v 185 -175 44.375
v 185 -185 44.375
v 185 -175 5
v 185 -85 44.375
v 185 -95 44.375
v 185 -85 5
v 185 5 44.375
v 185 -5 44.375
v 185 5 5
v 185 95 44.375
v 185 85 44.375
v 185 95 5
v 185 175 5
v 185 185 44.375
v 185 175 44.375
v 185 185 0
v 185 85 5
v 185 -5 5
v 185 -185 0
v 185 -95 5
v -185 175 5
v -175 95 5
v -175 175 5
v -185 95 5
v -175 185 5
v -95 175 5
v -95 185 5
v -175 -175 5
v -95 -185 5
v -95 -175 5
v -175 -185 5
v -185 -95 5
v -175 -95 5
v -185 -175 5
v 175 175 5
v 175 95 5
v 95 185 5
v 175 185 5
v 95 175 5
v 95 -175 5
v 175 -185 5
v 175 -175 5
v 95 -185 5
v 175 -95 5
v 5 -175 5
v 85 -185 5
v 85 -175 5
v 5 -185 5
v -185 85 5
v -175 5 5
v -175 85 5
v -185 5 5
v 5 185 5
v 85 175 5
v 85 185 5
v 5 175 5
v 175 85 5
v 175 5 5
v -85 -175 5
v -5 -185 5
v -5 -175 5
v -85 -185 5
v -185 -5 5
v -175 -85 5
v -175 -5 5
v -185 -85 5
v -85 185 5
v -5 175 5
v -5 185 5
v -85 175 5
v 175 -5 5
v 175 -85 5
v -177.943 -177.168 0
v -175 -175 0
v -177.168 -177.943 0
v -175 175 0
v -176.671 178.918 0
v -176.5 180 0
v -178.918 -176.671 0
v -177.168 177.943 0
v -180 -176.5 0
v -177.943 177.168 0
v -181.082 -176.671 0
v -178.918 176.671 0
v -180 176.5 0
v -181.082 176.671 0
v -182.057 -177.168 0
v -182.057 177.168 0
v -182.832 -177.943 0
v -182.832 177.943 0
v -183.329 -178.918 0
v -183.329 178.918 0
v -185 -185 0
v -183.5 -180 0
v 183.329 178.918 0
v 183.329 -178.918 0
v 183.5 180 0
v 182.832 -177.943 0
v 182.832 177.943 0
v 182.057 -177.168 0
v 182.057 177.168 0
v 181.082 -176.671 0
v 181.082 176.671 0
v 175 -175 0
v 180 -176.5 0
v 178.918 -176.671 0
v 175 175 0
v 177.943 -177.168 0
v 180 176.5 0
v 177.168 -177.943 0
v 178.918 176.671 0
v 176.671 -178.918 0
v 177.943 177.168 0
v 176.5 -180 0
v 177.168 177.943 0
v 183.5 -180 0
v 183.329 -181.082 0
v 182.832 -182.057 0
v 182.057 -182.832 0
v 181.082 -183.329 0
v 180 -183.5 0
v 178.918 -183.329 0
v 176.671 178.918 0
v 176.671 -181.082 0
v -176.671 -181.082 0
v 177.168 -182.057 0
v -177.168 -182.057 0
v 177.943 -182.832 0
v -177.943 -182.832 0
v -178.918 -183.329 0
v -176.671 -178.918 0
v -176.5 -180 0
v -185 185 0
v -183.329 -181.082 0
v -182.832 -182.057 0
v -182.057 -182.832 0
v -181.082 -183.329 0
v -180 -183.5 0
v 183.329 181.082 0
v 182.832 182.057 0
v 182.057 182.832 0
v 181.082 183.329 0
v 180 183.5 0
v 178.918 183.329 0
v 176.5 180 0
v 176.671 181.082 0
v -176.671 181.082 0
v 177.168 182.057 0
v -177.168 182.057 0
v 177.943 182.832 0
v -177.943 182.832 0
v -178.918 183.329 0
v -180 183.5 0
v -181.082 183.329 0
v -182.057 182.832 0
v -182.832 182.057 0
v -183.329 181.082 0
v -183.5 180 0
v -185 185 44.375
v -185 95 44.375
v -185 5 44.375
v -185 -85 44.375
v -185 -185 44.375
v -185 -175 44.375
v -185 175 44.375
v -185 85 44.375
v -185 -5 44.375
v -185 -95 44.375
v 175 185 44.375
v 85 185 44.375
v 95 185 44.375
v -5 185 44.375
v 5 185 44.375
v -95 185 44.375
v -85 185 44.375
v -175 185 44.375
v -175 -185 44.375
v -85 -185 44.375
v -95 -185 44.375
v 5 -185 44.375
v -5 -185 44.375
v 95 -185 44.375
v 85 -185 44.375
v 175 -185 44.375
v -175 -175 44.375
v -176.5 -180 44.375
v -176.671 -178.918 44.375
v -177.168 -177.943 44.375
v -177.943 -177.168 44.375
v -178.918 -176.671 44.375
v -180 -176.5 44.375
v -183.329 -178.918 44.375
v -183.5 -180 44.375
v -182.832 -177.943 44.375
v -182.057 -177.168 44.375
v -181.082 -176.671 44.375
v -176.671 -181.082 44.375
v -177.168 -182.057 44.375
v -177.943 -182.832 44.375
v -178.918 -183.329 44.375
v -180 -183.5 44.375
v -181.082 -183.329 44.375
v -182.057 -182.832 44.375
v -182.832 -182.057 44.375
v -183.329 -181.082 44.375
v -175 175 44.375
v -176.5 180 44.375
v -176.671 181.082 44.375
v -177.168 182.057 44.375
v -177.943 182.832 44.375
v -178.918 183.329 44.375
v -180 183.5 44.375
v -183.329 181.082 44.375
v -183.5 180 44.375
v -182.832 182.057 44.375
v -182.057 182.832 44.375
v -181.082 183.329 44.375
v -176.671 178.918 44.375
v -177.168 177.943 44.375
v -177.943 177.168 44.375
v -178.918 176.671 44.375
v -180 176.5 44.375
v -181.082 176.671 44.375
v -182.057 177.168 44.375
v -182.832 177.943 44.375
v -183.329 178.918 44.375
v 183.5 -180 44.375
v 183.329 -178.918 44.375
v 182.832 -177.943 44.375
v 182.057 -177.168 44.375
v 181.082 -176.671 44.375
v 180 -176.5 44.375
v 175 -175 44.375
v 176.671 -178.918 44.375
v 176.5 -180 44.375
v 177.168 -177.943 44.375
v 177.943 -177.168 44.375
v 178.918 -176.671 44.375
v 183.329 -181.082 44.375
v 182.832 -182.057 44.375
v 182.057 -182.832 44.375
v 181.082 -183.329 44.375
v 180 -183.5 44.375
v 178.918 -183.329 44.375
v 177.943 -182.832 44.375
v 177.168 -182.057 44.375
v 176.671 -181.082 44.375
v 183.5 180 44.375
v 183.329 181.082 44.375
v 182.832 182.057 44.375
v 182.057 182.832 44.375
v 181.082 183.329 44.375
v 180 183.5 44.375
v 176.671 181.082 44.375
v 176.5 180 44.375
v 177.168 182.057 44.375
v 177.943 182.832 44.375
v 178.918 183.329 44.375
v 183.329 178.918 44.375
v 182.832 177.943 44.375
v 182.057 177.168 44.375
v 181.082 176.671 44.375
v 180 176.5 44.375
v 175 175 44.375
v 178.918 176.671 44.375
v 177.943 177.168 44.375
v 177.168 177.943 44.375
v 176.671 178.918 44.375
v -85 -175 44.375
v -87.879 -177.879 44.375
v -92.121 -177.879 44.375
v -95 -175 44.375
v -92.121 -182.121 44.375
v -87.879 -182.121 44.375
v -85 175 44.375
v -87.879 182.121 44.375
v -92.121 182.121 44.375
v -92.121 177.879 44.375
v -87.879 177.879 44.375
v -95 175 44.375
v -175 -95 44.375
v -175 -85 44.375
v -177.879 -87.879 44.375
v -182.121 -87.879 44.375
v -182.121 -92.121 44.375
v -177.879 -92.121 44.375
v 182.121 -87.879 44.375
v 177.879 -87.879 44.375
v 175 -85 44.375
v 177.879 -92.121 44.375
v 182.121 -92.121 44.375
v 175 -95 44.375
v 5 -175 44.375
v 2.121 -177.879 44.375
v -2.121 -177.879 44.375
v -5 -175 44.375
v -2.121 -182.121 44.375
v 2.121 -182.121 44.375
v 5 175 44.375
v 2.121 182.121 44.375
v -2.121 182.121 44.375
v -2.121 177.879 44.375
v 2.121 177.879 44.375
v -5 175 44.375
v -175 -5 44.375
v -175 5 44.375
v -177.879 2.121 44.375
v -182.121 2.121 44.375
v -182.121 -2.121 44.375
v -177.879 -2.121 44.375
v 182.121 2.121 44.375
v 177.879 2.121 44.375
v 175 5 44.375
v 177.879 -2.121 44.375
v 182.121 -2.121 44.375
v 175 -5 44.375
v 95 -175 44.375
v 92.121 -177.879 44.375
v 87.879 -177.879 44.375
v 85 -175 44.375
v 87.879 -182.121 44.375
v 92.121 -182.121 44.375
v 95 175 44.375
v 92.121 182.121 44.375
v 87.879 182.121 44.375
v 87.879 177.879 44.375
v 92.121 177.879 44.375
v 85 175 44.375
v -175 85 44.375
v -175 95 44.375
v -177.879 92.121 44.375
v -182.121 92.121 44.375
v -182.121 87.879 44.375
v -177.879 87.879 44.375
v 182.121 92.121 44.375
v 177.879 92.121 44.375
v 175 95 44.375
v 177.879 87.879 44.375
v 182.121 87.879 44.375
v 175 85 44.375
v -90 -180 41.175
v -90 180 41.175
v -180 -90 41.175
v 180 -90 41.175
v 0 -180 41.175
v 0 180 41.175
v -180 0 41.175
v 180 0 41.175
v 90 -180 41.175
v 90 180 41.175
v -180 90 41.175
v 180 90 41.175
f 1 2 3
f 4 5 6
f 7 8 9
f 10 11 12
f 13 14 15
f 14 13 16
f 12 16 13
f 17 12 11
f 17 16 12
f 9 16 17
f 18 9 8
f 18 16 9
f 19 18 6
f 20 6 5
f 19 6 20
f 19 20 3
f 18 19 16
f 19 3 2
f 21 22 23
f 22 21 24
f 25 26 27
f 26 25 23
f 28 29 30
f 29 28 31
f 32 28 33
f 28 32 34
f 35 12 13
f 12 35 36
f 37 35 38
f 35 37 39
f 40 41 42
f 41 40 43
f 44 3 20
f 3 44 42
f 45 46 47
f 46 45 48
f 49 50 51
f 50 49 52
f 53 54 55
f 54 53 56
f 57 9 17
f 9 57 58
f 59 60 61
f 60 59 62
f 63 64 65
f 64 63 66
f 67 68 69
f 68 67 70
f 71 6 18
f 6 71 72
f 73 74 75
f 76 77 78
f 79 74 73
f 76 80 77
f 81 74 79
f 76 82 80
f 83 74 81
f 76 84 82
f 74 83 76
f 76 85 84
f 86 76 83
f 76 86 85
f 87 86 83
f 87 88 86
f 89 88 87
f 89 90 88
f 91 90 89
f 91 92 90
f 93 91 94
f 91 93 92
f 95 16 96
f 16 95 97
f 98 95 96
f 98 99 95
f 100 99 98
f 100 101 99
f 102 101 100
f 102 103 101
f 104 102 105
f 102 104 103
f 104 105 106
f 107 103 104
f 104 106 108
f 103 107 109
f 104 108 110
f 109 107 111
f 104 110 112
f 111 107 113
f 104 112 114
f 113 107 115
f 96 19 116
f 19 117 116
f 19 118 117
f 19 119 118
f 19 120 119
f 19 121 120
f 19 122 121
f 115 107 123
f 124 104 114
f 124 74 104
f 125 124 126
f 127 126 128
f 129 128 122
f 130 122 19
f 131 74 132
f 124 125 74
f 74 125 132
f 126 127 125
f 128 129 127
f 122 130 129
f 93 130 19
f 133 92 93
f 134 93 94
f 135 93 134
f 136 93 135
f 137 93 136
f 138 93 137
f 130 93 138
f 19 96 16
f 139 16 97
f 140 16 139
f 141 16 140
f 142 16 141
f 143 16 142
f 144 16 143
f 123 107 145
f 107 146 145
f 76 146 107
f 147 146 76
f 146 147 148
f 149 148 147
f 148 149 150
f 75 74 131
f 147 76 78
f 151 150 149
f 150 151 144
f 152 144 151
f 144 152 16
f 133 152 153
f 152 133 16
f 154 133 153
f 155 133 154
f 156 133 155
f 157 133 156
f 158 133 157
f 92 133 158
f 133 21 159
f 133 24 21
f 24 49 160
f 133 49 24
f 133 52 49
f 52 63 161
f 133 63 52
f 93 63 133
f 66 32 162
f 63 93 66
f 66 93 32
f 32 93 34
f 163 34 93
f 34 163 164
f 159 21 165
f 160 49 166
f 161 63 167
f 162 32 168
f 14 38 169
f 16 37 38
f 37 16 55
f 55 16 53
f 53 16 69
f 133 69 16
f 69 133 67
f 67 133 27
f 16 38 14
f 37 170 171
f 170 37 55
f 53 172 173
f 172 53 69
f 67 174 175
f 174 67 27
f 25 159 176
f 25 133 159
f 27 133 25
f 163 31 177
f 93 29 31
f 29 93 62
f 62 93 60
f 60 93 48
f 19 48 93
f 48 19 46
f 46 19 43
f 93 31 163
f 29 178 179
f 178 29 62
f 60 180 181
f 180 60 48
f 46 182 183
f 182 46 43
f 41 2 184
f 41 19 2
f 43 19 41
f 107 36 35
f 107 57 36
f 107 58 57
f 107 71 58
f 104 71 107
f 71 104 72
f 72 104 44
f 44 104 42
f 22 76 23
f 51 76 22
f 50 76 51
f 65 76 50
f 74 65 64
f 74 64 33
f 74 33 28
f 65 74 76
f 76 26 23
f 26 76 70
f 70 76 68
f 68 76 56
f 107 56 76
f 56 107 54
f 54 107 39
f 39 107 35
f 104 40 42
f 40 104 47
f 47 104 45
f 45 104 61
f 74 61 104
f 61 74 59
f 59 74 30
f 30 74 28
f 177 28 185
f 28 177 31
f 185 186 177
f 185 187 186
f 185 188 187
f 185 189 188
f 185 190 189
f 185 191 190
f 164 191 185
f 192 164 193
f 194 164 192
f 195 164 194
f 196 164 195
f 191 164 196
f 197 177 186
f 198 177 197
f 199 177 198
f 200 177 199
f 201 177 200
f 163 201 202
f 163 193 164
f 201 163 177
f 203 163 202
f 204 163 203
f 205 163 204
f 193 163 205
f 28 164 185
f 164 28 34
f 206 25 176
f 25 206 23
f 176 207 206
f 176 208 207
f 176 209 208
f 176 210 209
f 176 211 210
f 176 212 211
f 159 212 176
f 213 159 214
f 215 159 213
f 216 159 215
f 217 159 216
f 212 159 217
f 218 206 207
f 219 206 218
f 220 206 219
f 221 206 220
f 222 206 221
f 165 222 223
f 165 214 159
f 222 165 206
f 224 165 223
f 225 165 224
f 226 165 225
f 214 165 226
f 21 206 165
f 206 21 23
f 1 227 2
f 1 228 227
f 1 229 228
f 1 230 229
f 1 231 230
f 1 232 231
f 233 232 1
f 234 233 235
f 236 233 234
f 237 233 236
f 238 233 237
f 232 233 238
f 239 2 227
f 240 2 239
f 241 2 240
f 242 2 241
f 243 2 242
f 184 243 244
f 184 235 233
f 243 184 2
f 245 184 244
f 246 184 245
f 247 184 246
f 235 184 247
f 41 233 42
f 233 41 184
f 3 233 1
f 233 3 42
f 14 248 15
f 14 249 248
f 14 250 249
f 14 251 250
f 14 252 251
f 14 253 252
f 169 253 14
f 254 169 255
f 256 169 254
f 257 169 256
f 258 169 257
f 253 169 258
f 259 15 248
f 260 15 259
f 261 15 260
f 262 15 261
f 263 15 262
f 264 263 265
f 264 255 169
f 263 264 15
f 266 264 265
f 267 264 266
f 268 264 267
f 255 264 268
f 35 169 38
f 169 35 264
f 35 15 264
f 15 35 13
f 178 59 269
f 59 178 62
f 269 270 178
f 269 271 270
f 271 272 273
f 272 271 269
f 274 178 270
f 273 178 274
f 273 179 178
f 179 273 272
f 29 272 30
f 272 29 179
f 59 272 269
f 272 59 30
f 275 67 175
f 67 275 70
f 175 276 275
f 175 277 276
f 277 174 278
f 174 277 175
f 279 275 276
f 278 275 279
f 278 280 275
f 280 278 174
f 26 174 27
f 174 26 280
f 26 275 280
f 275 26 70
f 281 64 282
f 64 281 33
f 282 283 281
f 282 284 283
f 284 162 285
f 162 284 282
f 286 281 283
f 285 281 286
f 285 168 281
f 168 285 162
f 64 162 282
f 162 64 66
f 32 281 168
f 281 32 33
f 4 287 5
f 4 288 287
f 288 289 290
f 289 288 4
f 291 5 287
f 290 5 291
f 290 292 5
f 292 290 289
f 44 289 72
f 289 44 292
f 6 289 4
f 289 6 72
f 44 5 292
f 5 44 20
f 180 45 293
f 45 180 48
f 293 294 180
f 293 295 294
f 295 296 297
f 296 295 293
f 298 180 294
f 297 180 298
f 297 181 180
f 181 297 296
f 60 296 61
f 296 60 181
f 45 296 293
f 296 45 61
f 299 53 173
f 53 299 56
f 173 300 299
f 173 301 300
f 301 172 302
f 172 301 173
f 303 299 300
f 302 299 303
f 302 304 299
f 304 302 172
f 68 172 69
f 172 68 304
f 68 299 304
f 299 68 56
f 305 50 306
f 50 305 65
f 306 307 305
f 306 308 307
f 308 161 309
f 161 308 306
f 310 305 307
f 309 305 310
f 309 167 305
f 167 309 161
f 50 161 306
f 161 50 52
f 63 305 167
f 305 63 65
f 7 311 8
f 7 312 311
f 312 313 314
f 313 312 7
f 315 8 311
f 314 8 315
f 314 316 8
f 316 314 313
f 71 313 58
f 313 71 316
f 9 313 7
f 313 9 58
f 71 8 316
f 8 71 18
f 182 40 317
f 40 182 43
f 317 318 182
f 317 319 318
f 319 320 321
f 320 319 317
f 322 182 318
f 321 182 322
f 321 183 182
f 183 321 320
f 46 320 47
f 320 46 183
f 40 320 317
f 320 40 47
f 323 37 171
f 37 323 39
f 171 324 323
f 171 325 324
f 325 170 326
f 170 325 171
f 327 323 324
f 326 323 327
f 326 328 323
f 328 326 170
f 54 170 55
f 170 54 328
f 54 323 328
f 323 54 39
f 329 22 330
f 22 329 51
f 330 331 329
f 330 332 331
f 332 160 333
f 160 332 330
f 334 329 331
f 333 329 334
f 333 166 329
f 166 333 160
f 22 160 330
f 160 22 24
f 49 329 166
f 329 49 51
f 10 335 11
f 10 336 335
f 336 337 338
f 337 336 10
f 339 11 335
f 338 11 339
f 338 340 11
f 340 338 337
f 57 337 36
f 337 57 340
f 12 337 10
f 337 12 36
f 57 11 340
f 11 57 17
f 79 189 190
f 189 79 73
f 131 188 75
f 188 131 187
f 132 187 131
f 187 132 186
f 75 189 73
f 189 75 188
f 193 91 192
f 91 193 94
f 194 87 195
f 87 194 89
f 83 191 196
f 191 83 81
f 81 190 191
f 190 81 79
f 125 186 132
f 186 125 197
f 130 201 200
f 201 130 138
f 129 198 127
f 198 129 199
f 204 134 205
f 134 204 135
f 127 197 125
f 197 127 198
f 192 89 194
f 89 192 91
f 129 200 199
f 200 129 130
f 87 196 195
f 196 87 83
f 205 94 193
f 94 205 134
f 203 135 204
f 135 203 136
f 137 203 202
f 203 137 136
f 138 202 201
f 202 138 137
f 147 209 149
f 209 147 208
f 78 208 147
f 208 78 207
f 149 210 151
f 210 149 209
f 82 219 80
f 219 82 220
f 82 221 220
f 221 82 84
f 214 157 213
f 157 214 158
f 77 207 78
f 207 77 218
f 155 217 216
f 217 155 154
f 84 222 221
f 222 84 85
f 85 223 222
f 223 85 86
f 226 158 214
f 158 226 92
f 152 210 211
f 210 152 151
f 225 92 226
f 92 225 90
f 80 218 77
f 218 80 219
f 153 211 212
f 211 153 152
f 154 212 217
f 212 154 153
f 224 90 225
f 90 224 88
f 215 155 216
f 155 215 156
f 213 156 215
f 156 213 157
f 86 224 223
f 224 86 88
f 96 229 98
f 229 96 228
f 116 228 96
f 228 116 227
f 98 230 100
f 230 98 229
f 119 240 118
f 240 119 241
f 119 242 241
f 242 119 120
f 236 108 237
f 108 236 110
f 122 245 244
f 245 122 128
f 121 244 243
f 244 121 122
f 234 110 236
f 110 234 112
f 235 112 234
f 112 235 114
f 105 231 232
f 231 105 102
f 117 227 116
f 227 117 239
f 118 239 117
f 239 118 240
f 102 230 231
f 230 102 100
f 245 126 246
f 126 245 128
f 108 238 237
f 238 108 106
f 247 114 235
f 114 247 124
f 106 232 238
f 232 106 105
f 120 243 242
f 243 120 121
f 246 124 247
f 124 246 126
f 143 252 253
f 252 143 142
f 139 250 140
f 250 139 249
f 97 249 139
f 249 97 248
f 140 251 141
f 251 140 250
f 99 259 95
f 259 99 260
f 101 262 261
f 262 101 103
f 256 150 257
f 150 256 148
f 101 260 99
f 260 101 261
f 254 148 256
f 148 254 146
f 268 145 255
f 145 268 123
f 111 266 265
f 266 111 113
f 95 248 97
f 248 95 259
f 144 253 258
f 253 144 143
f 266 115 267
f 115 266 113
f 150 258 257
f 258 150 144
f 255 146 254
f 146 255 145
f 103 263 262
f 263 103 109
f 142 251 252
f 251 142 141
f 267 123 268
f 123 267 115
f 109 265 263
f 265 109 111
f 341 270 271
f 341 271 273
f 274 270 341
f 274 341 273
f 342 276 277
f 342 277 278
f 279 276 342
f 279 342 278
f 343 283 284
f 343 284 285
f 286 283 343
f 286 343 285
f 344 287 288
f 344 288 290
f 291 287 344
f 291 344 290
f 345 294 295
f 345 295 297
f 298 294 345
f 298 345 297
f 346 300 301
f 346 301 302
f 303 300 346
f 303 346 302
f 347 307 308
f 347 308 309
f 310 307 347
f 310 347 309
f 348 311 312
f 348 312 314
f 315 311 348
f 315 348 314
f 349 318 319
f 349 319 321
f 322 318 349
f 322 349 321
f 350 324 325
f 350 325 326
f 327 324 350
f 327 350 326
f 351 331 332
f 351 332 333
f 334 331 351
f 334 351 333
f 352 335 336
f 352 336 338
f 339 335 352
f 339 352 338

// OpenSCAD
module pyramid_socket() {
    // Inverted pyramid for subtraction, slightly larger for clearance
    rotate([0,0,45]) cylinder(h=3.2, d1=0, d2=6.0, $fn=4);
}

module hemi_female() {
    bar_h = 39.375;
    difference() {
        union() {
            // Base Ring
            translate([0,0,2.5]) difference() {
                cube([370, 370, 5], center=true);
                cube([350, 350, 5.1], center=true);
            }
            // Bars
            // Corners
            for (x = [-180, 180]) {
                for (y = [-180, 180]) {
                    translate([x, y, 5 + bar_h/2]) cube([10, 10, bar_h], center=true);
                }
            }
            // Intermediates
            for (i = [-90, 0, 90]) {
                for (pos = [[i, -180], [i, 180], [-180, i], [180, i]]) {
                     translate([pos[0], pos[1], 5 + bar_h/2]) cube([10, 10, bar_h], center=true);
                }
            }
        }
        // Corner Holes
        for (x = [-180, 180]) {
            for (y = [-180, 180]) {
                translate([x, y, -1]) cylinder(h=100, d=7, $fn=20);
            }
        }
        // Female Sockets
        for (i = [-90, 0, 90]) {
            for (pos = [[i, -180], [i, 180], [-180, i], [180, i]]) {
                 translate([pos[0], pos[1], 5 + bar_h - 3.2]) pyramid_socket();
            }
        }
    }
}

hemi_female();
